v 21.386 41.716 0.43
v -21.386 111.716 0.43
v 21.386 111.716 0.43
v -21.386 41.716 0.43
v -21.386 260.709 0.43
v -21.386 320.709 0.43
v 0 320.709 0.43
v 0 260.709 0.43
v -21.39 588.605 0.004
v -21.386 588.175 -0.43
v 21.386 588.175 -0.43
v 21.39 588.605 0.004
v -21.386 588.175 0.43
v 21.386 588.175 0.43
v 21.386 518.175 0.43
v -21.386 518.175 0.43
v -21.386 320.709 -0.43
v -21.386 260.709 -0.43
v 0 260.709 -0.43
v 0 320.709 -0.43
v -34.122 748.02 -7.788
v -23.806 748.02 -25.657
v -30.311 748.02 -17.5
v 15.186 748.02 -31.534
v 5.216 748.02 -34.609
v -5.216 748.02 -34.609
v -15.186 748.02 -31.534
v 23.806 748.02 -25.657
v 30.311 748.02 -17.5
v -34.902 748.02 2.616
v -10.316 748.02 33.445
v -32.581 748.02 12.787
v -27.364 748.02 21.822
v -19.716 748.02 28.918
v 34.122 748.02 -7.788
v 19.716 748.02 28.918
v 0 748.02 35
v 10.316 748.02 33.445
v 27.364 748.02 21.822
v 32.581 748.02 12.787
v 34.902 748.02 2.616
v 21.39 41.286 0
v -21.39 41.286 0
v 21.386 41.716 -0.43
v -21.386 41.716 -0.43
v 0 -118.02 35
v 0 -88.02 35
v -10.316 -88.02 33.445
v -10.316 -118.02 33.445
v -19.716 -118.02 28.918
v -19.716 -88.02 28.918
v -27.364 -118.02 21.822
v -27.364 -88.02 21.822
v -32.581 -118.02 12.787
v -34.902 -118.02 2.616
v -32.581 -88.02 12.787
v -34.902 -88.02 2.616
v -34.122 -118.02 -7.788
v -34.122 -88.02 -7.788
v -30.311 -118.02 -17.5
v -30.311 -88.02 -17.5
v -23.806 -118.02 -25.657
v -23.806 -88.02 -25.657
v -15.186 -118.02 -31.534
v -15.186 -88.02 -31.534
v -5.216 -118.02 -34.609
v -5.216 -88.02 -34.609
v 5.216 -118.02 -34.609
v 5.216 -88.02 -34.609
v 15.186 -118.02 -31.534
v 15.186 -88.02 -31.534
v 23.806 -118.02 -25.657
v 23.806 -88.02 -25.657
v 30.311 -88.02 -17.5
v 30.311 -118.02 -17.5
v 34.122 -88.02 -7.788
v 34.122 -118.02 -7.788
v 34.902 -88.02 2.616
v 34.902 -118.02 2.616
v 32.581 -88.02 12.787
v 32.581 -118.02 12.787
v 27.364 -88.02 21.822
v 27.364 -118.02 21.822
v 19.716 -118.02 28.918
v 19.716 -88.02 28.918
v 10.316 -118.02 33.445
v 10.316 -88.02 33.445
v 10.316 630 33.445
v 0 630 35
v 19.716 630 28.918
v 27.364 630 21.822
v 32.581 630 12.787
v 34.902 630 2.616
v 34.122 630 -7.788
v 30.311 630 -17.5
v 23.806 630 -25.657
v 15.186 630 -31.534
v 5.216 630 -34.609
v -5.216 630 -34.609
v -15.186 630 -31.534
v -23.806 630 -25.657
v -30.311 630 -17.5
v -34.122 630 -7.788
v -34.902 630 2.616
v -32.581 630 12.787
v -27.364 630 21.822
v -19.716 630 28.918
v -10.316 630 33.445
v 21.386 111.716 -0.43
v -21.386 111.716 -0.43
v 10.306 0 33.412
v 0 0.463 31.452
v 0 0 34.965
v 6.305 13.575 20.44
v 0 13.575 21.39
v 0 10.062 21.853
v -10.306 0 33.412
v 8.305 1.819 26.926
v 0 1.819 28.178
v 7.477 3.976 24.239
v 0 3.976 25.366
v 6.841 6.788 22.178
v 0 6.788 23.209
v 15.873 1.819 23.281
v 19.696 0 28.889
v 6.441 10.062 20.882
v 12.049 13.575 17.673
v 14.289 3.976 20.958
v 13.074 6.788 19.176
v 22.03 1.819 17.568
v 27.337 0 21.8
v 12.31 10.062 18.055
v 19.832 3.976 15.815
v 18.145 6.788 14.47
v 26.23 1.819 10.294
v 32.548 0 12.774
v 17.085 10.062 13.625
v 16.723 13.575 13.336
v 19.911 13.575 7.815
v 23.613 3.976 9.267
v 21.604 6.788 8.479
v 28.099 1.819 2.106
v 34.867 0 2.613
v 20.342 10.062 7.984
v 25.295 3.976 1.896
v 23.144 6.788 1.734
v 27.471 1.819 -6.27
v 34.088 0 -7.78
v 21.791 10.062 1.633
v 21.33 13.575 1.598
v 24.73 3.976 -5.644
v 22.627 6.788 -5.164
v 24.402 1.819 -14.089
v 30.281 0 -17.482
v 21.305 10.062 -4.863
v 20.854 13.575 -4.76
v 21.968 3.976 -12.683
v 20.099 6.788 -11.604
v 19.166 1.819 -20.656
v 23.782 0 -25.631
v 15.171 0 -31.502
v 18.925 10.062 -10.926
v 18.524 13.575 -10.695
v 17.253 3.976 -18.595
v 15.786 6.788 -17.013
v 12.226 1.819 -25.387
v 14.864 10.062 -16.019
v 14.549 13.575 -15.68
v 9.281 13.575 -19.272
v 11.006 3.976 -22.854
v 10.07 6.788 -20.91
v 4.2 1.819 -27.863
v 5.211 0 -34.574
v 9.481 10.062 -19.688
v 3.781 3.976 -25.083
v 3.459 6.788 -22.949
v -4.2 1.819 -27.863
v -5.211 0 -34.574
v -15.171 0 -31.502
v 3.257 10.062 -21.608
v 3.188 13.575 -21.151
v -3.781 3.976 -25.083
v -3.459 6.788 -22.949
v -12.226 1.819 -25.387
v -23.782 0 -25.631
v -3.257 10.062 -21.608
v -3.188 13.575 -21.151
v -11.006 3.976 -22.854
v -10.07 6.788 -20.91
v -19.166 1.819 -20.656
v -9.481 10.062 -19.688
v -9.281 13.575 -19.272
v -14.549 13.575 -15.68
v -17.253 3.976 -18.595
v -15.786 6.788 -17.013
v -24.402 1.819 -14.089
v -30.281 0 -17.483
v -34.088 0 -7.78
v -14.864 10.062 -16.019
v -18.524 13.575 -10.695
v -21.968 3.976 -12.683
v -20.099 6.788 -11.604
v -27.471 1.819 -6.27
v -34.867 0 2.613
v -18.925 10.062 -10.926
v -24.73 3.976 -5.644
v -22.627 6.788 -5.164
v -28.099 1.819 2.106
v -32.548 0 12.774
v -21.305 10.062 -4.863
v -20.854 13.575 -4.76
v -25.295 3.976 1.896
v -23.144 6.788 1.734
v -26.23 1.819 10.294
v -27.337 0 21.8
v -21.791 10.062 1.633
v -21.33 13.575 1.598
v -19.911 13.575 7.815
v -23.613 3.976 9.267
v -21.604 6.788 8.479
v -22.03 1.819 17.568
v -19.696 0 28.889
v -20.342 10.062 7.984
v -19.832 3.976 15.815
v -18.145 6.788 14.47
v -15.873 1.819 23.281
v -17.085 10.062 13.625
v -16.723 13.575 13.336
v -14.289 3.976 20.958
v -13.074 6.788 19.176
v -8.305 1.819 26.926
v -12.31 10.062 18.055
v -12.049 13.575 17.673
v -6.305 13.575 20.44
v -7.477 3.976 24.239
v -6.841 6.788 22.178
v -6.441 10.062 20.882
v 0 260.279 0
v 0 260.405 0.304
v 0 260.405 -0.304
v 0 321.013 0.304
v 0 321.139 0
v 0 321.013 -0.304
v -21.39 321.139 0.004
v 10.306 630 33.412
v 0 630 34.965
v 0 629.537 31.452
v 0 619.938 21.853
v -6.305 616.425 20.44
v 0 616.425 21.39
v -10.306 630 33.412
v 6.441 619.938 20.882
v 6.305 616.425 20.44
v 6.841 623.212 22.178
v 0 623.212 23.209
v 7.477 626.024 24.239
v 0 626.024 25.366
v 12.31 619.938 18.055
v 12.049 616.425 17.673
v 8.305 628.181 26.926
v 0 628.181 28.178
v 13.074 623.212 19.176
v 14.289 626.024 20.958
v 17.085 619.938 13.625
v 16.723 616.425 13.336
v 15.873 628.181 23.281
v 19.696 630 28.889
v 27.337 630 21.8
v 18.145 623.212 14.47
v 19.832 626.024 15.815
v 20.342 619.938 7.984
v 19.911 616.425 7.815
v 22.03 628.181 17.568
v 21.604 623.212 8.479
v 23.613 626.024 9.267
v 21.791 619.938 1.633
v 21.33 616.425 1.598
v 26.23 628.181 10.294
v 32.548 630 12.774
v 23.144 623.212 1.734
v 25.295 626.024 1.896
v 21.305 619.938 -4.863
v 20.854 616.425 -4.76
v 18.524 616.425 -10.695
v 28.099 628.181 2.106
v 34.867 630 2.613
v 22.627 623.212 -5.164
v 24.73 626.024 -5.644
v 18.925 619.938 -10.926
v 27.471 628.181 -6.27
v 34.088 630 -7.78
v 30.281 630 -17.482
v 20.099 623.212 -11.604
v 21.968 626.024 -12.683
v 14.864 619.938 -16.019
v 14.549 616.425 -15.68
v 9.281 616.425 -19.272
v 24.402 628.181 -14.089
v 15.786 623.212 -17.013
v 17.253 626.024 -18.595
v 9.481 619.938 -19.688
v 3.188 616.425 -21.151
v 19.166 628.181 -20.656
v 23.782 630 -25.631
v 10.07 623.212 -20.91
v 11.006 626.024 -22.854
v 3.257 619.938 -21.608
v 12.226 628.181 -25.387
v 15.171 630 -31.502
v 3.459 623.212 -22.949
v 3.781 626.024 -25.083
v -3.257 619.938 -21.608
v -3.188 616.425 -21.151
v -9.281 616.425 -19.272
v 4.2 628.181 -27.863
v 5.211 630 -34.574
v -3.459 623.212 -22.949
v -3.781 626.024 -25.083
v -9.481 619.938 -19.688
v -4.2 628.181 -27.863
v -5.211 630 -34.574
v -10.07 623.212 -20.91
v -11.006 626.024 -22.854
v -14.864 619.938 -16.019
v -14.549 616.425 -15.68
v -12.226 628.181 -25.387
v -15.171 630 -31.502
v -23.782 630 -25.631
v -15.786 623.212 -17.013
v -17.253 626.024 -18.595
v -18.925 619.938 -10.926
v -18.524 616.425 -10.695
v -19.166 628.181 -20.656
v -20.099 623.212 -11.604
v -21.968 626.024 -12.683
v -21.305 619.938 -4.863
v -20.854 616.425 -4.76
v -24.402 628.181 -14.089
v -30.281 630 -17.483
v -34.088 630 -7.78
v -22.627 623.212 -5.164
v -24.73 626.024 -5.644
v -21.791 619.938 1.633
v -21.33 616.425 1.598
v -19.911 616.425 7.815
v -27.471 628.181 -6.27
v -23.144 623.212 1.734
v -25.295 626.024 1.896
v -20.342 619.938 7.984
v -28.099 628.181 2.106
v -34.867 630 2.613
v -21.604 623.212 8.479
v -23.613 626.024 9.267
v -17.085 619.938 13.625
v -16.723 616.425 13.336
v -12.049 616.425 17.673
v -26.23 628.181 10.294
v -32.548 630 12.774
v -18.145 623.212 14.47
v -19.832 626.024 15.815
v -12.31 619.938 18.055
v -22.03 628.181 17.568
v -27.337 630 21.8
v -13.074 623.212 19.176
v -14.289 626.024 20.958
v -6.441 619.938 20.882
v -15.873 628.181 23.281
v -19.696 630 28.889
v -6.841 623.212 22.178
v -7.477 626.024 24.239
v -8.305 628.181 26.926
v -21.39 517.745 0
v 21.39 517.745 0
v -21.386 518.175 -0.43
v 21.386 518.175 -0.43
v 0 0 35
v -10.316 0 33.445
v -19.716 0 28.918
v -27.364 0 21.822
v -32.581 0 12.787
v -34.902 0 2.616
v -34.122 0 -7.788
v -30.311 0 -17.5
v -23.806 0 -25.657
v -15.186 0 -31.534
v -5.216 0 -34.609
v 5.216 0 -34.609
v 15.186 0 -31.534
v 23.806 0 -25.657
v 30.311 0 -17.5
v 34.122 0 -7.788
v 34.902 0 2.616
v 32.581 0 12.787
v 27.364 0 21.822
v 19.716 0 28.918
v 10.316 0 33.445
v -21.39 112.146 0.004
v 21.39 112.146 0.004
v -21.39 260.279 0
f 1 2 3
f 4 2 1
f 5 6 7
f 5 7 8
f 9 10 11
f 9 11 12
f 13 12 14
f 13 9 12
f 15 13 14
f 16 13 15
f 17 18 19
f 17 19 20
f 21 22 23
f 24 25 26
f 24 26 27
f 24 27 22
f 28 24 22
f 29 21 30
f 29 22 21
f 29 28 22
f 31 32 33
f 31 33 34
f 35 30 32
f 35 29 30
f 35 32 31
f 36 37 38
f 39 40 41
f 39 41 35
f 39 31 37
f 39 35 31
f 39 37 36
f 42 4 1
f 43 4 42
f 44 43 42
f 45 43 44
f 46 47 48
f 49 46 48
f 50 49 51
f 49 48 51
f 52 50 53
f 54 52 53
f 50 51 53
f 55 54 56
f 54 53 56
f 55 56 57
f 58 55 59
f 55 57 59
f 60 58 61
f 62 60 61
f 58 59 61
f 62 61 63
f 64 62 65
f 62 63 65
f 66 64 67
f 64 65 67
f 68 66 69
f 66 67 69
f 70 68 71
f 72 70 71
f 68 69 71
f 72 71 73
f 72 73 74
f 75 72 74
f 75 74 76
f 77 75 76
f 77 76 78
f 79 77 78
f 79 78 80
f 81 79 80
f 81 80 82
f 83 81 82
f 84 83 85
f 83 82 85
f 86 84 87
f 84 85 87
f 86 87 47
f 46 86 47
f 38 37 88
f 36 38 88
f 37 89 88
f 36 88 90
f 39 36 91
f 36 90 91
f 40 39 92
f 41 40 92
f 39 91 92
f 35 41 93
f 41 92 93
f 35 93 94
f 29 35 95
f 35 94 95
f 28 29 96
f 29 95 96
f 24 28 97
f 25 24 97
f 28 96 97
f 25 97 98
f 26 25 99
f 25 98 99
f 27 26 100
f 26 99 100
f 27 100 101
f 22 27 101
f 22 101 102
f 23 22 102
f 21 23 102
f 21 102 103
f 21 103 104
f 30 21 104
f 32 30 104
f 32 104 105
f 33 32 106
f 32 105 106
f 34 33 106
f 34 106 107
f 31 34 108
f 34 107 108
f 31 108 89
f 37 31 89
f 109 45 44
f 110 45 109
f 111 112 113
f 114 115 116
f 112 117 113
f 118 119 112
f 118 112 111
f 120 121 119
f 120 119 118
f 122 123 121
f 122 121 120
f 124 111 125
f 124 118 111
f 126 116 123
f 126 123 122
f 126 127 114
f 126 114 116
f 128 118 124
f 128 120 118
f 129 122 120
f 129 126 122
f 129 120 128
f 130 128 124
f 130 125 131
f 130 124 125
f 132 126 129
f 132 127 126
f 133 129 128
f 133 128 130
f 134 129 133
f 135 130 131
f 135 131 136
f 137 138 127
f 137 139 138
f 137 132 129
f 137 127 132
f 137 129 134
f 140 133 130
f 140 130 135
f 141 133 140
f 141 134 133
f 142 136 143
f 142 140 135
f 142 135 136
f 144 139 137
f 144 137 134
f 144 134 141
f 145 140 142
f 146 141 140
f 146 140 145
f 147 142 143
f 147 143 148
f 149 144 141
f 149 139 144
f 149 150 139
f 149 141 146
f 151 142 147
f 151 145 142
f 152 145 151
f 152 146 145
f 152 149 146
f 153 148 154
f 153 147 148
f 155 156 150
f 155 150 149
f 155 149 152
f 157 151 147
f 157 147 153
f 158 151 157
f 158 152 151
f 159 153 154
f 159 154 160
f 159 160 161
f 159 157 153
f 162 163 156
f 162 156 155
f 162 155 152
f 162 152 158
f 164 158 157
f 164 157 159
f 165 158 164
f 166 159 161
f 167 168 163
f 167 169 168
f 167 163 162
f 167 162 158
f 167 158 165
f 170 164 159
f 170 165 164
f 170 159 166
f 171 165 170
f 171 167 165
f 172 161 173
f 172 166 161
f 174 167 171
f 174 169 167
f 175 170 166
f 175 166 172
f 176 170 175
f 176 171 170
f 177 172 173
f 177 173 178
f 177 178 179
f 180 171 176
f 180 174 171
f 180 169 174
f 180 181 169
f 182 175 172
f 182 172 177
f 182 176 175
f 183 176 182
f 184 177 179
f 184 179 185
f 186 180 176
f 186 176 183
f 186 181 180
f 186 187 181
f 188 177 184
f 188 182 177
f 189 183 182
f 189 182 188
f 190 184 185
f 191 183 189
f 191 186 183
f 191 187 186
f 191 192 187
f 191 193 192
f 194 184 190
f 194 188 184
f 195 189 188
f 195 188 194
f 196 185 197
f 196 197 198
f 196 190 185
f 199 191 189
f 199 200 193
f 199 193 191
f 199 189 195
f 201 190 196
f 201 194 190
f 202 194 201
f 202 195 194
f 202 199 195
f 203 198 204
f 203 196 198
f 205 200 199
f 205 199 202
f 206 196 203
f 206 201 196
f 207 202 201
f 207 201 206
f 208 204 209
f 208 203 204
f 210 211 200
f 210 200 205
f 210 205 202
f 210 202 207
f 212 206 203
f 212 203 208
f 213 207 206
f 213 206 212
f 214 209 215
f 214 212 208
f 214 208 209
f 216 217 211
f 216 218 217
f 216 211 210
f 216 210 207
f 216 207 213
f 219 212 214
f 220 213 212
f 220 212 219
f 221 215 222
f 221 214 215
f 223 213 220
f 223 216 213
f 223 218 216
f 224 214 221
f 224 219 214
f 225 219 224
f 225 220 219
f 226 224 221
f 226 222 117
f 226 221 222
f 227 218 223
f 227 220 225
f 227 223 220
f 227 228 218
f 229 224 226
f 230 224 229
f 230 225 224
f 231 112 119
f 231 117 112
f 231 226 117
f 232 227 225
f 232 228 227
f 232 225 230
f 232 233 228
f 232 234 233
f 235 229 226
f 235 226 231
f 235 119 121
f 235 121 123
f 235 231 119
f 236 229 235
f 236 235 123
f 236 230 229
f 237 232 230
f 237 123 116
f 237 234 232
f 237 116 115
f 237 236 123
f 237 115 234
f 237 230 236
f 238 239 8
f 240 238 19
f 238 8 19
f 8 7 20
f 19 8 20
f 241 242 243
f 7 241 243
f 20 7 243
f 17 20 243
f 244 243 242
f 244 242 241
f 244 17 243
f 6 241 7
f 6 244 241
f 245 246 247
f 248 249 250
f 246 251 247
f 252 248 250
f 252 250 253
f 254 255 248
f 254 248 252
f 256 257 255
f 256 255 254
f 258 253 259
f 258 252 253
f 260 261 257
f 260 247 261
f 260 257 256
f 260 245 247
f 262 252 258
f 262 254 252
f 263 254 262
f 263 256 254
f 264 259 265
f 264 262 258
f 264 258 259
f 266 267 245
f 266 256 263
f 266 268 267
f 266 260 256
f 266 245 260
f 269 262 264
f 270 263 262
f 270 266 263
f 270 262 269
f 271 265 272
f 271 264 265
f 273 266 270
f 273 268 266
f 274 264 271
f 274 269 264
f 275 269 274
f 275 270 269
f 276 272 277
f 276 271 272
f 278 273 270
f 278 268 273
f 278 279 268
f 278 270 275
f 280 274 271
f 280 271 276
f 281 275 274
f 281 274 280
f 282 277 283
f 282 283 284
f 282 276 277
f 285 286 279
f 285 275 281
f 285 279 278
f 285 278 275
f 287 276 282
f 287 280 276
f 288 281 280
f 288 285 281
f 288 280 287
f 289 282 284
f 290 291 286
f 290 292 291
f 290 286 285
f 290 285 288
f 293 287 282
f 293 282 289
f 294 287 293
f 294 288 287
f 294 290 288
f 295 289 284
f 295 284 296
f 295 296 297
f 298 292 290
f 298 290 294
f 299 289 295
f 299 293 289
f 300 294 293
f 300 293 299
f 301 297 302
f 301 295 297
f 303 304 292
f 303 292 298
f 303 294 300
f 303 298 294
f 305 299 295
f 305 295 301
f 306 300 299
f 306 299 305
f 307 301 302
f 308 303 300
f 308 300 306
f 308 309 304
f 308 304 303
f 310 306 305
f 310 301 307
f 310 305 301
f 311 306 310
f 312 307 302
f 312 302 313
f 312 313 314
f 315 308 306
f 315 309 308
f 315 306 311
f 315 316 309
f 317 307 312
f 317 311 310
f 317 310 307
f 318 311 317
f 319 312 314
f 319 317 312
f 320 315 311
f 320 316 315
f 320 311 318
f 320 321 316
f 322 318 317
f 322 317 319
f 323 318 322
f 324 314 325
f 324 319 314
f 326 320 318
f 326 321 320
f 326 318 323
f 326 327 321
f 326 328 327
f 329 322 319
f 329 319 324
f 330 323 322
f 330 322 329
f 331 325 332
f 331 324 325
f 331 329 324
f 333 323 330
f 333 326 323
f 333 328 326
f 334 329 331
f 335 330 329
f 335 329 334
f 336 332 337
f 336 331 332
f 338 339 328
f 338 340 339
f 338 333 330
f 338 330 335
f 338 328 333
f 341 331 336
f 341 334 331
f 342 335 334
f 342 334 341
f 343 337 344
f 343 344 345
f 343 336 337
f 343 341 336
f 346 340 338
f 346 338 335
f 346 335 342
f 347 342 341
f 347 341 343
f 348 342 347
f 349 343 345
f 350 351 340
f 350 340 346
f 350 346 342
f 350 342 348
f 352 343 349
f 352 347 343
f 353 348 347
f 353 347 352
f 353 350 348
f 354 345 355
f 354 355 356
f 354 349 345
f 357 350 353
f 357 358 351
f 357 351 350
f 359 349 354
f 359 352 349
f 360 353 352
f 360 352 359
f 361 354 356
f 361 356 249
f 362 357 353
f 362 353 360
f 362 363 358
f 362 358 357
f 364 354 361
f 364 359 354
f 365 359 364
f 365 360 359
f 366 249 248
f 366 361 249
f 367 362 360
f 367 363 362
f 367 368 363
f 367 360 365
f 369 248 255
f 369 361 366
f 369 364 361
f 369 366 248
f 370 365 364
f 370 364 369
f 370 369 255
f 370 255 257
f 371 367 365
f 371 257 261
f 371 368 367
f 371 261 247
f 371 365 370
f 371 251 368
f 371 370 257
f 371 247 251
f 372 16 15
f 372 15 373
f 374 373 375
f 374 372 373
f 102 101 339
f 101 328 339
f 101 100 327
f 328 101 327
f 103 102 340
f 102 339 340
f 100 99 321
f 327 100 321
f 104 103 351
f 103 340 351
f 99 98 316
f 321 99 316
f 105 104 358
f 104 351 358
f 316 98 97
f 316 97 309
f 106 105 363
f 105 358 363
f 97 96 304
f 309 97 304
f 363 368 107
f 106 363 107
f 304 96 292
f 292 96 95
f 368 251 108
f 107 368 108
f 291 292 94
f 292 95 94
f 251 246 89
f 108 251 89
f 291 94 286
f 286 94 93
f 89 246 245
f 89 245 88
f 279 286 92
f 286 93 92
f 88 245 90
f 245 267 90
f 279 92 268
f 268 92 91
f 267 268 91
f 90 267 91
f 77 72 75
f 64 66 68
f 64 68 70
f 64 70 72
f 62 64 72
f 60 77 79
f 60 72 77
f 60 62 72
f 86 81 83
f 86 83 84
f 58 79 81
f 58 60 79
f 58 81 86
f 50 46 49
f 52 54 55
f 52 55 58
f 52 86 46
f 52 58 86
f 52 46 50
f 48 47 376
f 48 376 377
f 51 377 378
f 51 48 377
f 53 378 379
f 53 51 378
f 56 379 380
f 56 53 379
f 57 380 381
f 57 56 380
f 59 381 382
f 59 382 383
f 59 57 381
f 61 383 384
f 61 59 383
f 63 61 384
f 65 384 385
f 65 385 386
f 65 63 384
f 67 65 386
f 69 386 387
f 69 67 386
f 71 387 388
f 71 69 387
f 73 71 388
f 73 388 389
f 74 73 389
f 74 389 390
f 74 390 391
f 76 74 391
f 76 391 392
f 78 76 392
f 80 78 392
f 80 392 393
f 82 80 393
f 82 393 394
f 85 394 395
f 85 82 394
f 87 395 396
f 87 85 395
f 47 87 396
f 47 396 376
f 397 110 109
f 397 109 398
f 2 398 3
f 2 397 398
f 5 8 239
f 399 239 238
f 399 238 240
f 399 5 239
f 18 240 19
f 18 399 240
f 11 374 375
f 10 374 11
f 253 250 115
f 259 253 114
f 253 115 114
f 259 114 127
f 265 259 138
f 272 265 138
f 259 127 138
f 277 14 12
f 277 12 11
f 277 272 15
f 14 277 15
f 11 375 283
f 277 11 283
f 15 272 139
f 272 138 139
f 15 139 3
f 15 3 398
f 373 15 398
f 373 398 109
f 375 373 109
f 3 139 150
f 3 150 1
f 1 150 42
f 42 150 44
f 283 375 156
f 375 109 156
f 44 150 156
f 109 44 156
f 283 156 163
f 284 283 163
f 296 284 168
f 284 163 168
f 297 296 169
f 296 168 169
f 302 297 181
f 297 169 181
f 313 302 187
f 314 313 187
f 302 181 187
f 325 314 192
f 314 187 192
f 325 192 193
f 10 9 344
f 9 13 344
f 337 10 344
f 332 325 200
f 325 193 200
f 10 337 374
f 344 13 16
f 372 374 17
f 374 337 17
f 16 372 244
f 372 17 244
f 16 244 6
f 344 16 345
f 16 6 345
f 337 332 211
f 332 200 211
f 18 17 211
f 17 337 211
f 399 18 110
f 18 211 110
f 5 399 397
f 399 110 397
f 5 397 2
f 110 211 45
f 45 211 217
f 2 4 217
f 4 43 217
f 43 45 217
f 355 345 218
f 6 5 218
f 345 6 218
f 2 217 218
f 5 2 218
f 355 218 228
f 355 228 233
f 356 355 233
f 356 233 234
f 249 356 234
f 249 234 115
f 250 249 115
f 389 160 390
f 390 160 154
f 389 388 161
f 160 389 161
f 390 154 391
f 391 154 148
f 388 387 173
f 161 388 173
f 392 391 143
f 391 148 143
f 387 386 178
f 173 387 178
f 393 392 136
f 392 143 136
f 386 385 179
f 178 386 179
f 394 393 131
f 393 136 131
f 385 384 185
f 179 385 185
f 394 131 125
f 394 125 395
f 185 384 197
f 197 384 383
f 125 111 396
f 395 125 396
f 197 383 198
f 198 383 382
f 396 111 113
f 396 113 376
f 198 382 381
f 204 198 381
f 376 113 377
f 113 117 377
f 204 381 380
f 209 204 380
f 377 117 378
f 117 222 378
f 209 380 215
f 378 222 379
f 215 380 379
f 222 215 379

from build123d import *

# Parameters (mm, degrees)
SKETCH1_R               = 21.39
BOSS_EXTRUDE1_DEPTH     = 630
SKETCH2_R               = 35
BOSS_EXTRUDE2_DEPTH     = 88.02
BOSS_EXTRUDE3_START     = 88.02
SKETCH3_R               = 35
BOSS_EXTRUDE3_DEPTH     = 88.02
FILLET3_R               = 13.575
MOVE_FACE1_BY           = 30
MOVE_FACE2_BY           = 30
CUT_EXTRUDE1_DEPTH      = 750.655867982
CUT_EXTRUDE1_DEPTH_BACK = 750.655867982
CUT_EXTRUDE2_START      = -21.390000045
CUT_EXTRUDE2_DEPTH      = 21.390000045


# Read off the part's stored shape, not the designer's step: Cut-Extrude2
with BuildPart() as part:
    # Sketch1 → Boss-Extrude1 (new body)
    with BuildSketch(Plane(origin=(0, 0, 0), x_dir=(1, 0, 0), z_dir=(0, 1, 0))):
        with Locations(Location((0, 0, 0), (0, 0, 270))):
            Circle(SKETCH1_R)
    extrude(amount=BOSS_EXTRUDE1_DEPTH)

    # Sketch2 → Boss-Extrude2 (add)
    with BuildSketch(Plane(origin=(0, 630, 0), x_dir=(1, 0, 0), z_dir=(0, 1, 0))):
        with Locations(Location((0, 0, 0), (0, 0, 270))):
            Circle(SKETCH2_R)
    extrude(amount=BOSS_EXTRUDE2_DEPTH)

    # Sketch3 → Boss-Extrude3 (add)
    with BuildSketch(Plane.XZ.offset(BOSS_EXTRUDE3_START)):
        with Locations(Location((0, 0, 0), (0, 0, 90))):
            Circle(SKETCH3_R)
    extrude(amount=-BOSS_EXTRUDE3_DEPTH)

    # Fillet3
    fillet3_edges = [part.edges().sort_by_distance(p)[0] for p in [
        (0, 630, -21.39),
        (0, 0, -21.39),
    ]]
    fillet(fillet3_edges, radius=FILLET3_R)

    # Move Face1: a face moved outward by 30.0
    extrude(part.faces().sort_by_distance((0, 718.02, 0))[0], amount=MOVE_FACE1_BY, dir=(0, 1, 0))

    # Move Face2: a face moved outward by 30.0
    extrude(part.faces().sort_by_distance((0, -88.02, 0))[0], amount=MOVE_FACE2_BY, dir=(0, -1, 0))

    # Sketch4 → Cut-Extrude1 (cut, two sides: drawn at the far end of the back side and taken through both)
    with BuildSketch(Plane(origin=(0, 0, 0), x_dir=(0, 0, -1), z_dir=(1, 0, 0)).offset(-CUT_EXTRUDE1_DEPTH_BACK)):
        with BuildLine():
            Line((-0.43, 588.175), (-0.43, 518.175))
            ThreePointArc((-0.43, 518.175), (0, 517.745), (0.43, 518.175))
            Line((0.43, 518.175), (0.43, 588.175))
            ThreePointArc((0.43, 588.175), (0, 588.605), (-0.43, 588.175))
        make_face()
        with BuildLine():
            Line((-0.43, 111.71612329), (-0.43, 41.71612329))
            ThreePointArc((-0.43, 41.71612329), (0, 41.28612329), (0.43, 41.71612329))
            Line((0.43, 41.71612329), (0.43, 111.71612329))
            ThreePointArc((0.43, 111.71612329), (0, 112.14612329), (-0.43, 111.71612329))
        make_face()
    extrude(amount=CUT_EXTRUDE1_DEPTH + CUT_EXTRUDE1_DEPTH_BACK, mode=Mode.SUBTRACT)

    # Cut-Extrude2 outline → Cut-Extrude2 (cut)
    with BuildSketch(Plane(origin=(0, 0, 0), x_dir=(0, 0, -1), z_dir=(1, 0, 0)).offset(CUT_EXTRUDE2_START)):
        with BuildLine():
            ThreePointArc((-0.43, 260.7089), (0, 260.2789), (0.43, 260.7089))
            Line((0.43, 260.7089), (0.43, 320.7089))
            ThreePointArc((0.43, 320.7089), (0, 321.1389), (-0.43, 320.7089))
            Line((-0.43, 320.7089), (-0.43, 260.7089))
        make_face()
    extrude(amount=CUT_EXTRUDE2_DEPTH, mode=Mode.SUBTRACT)


solid = part.part
